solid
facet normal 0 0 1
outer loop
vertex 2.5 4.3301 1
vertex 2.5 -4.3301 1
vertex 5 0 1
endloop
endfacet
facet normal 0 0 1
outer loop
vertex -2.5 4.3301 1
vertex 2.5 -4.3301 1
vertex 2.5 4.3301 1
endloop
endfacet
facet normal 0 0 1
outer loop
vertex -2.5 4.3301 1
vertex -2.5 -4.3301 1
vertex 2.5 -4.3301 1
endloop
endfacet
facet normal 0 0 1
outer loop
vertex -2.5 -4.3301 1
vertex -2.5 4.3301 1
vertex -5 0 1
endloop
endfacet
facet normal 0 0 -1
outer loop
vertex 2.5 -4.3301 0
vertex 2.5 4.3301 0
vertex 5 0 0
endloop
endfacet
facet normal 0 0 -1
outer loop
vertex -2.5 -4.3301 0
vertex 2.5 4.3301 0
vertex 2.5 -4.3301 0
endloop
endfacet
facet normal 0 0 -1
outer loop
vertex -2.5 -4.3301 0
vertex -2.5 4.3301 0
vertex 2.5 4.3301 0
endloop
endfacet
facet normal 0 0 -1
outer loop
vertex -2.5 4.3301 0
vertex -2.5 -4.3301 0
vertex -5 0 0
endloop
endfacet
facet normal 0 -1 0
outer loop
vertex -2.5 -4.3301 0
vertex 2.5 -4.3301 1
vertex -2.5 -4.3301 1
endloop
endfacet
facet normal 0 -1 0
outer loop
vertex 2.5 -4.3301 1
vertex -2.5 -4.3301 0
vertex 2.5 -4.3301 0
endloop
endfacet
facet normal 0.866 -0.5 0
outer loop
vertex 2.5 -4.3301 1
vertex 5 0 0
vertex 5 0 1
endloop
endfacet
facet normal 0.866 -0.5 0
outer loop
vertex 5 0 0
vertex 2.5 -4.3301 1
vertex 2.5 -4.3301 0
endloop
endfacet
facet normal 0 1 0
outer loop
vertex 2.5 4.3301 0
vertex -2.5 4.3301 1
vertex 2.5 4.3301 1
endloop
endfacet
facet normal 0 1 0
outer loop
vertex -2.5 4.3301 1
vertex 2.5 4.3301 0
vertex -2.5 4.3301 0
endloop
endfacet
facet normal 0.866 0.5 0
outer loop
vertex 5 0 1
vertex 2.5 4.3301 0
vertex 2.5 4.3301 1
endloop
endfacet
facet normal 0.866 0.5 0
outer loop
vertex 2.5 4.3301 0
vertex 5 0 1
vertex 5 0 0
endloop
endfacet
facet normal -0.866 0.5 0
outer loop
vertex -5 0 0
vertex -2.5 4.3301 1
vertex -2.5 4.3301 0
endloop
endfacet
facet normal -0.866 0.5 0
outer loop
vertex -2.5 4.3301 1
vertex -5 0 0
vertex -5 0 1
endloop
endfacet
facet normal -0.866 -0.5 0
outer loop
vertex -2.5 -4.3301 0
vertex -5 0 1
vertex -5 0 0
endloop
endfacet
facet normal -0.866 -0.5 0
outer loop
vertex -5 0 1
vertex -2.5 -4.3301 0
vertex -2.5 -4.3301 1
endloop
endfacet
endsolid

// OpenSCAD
// file: cookie_cutter.scad
module dxf(file, layer, height) {
   linear_extrude(height = height)
       import(file = file, layer = layer);
}

module needle(height, thin1, thin2) {
   union() {
      cylinder(r = thin1, h = height-1.5, $fn = 6);
      cylinder(r = thin2, h = height, $fn = 6);
   }
}

module wall(file, layer, height, thin) {
   difference() {
      minkowski() {
        dxf(file, layer, 0.01);
        cylinder(r = thin, h = height, $fn = 6);
      }
      translate([0, 0, -1]) dxf(file, layer, height + 2);
   }
}

module cutter(file, layer, height, nozzle_diameter) {
   thin1 = nozzle_diameter * 2.4;
   thin2 = nozzle_diameter * 1.2;
   difference() {
      minkowski() {
        dxf(file, layer, 0.01);
        needle(height, thin1, thin2);
      }
      translate([0, 0, -1]) dxf(file, layer, height + 2);
   }
}

module cookie_cutter(file, height, join_height, nozzle_diameter) {
   union () {
      cutter(file, "cutter", height, nozzle_diameter);
      wall(file, "outer", 1, 5);
      linear_extrude(height = join_height)
         import(file = file, layer = "join");
   }
}
// main file
include <cookie_cutter.scad>;
cookie_cutter("star.dxf", "star", 11, 0.4);
